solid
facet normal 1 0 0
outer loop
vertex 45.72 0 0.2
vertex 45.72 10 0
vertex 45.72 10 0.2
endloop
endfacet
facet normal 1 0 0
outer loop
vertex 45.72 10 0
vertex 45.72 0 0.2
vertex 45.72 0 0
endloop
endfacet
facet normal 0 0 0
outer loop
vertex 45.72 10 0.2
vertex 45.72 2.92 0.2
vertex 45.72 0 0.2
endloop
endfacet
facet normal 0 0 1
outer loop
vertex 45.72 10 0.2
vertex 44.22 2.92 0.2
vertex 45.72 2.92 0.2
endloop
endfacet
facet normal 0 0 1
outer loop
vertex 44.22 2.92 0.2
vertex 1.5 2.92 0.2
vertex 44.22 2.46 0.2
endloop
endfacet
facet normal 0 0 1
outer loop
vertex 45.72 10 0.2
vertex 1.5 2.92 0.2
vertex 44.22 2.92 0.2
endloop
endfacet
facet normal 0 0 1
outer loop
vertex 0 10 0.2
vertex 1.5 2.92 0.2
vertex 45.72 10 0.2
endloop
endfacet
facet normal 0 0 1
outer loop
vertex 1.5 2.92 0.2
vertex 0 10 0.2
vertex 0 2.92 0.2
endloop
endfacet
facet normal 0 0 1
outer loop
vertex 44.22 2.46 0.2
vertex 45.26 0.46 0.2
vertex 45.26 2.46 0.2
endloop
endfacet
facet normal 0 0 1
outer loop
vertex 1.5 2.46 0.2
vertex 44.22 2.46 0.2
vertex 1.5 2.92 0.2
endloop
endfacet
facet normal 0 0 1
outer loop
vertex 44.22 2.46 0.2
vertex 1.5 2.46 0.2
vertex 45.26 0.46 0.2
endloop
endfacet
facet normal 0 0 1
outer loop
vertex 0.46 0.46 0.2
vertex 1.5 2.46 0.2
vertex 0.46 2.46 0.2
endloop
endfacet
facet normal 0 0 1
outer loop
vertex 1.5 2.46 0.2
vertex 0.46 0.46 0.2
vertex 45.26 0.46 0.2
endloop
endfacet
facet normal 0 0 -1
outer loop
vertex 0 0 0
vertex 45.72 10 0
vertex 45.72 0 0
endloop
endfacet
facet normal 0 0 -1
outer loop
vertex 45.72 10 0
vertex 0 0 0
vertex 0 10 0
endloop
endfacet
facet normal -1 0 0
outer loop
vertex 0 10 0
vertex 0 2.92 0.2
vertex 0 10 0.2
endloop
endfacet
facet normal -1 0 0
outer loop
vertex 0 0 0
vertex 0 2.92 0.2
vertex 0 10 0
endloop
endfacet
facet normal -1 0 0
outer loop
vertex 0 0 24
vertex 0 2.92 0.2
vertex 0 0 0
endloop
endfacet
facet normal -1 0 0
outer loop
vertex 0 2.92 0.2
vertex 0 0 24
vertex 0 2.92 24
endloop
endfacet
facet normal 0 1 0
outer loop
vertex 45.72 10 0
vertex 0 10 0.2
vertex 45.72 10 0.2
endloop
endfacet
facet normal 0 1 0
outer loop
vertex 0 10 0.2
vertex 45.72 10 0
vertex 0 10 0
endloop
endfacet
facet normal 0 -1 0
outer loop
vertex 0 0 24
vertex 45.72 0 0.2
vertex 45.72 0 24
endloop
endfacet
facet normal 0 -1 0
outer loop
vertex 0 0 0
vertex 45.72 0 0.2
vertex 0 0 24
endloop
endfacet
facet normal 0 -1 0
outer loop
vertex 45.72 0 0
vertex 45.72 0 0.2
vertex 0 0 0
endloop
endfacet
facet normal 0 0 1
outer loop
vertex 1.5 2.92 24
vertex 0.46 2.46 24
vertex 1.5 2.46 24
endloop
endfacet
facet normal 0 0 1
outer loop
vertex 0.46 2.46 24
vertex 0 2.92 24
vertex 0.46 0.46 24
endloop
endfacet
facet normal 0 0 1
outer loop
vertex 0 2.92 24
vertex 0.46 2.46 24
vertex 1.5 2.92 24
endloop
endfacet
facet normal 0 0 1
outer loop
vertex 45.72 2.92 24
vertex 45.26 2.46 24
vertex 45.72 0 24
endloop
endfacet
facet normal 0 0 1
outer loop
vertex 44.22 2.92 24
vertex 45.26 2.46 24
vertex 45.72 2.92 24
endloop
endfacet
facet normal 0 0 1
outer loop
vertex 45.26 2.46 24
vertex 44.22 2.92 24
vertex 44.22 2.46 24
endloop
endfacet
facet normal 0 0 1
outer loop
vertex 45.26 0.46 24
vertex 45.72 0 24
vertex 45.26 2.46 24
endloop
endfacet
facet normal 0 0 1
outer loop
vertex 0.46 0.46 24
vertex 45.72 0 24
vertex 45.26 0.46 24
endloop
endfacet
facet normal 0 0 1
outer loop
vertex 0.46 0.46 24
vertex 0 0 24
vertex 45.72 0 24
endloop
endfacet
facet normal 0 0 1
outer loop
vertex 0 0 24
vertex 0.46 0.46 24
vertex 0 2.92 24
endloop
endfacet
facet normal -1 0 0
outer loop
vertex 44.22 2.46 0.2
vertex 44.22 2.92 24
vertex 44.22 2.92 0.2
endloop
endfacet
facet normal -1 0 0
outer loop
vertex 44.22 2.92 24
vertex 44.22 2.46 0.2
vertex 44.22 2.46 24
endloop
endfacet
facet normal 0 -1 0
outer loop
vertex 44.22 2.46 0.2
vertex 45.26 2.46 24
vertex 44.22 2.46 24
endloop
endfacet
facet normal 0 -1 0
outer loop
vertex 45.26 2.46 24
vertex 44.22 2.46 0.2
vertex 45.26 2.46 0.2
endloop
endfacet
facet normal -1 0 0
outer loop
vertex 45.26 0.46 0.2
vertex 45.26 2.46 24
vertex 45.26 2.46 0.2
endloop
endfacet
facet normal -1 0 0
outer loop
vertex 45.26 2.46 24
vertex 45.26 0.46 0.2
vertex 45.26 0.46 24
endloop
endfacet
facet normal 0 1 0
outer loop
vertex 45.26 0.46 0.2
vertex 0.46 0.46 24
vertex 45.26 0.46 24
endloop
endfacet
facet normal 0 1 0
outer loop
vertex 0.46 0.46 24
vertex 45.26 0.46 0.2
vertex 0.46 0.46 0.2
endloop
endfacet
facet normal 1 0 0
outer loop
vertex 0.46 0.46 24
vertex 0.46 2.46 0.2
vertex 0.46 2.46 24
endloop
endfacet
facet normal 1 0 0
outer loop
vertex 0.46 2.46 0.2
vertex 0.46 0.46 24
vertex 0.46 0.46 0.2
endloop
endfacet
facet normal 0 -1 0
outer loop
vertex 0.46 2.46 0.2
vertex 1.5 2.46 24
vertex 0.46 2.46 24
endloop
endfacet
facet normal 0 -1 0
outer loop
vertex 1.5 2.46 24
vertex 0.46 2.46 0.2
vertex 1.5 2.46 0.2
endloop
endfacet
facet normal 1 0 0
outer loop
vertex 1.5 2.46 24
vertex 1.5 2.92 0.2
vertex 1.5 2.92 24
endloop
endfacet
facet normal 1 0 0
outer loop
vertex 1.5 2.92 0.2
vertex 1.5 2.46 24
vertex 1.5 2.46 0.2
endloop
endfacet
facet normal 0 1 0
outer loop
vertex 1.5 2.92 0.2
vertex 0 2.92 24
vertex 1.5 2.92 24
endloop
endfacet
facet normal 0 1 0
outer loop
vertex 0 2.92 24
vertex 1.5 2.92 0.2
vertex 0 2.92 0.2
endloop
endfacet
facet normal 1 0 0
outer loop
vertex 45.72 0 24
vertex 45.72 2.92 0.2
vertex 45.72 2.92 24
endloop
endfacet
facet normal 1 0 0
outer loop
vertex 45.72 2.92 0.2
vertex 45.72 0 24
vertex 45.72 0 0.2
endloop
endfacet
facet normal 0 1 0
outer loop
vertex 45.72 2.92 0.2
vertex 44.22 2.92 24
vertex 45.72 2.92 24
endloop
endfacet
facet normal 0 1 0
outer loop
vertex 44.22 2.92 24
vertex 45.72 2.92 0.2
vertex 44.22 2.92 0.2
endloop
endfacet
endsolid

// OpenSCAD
muca_w = 24;
muca_h = 44.8;
muca_t = 2;
nozzle = 0.46;

cube([44.8+2*nozzle, 10, 0.2]);
linear_extrude(muca_w){
square([2*nozzle + muca_h, nozzle]);
square([nozzle, 2*nozzle + muca_t]);
translate([0, nozzle + muca_t])
    square([1.5, nozzle]);

translate([nozzle + muca_h, 0]){
    square([nozzle, 2*nozzle + muca_t]);
translate([-1.5+nozzle, nozzle + muca_t])
    square([1.5, nozzle]);
}
}
